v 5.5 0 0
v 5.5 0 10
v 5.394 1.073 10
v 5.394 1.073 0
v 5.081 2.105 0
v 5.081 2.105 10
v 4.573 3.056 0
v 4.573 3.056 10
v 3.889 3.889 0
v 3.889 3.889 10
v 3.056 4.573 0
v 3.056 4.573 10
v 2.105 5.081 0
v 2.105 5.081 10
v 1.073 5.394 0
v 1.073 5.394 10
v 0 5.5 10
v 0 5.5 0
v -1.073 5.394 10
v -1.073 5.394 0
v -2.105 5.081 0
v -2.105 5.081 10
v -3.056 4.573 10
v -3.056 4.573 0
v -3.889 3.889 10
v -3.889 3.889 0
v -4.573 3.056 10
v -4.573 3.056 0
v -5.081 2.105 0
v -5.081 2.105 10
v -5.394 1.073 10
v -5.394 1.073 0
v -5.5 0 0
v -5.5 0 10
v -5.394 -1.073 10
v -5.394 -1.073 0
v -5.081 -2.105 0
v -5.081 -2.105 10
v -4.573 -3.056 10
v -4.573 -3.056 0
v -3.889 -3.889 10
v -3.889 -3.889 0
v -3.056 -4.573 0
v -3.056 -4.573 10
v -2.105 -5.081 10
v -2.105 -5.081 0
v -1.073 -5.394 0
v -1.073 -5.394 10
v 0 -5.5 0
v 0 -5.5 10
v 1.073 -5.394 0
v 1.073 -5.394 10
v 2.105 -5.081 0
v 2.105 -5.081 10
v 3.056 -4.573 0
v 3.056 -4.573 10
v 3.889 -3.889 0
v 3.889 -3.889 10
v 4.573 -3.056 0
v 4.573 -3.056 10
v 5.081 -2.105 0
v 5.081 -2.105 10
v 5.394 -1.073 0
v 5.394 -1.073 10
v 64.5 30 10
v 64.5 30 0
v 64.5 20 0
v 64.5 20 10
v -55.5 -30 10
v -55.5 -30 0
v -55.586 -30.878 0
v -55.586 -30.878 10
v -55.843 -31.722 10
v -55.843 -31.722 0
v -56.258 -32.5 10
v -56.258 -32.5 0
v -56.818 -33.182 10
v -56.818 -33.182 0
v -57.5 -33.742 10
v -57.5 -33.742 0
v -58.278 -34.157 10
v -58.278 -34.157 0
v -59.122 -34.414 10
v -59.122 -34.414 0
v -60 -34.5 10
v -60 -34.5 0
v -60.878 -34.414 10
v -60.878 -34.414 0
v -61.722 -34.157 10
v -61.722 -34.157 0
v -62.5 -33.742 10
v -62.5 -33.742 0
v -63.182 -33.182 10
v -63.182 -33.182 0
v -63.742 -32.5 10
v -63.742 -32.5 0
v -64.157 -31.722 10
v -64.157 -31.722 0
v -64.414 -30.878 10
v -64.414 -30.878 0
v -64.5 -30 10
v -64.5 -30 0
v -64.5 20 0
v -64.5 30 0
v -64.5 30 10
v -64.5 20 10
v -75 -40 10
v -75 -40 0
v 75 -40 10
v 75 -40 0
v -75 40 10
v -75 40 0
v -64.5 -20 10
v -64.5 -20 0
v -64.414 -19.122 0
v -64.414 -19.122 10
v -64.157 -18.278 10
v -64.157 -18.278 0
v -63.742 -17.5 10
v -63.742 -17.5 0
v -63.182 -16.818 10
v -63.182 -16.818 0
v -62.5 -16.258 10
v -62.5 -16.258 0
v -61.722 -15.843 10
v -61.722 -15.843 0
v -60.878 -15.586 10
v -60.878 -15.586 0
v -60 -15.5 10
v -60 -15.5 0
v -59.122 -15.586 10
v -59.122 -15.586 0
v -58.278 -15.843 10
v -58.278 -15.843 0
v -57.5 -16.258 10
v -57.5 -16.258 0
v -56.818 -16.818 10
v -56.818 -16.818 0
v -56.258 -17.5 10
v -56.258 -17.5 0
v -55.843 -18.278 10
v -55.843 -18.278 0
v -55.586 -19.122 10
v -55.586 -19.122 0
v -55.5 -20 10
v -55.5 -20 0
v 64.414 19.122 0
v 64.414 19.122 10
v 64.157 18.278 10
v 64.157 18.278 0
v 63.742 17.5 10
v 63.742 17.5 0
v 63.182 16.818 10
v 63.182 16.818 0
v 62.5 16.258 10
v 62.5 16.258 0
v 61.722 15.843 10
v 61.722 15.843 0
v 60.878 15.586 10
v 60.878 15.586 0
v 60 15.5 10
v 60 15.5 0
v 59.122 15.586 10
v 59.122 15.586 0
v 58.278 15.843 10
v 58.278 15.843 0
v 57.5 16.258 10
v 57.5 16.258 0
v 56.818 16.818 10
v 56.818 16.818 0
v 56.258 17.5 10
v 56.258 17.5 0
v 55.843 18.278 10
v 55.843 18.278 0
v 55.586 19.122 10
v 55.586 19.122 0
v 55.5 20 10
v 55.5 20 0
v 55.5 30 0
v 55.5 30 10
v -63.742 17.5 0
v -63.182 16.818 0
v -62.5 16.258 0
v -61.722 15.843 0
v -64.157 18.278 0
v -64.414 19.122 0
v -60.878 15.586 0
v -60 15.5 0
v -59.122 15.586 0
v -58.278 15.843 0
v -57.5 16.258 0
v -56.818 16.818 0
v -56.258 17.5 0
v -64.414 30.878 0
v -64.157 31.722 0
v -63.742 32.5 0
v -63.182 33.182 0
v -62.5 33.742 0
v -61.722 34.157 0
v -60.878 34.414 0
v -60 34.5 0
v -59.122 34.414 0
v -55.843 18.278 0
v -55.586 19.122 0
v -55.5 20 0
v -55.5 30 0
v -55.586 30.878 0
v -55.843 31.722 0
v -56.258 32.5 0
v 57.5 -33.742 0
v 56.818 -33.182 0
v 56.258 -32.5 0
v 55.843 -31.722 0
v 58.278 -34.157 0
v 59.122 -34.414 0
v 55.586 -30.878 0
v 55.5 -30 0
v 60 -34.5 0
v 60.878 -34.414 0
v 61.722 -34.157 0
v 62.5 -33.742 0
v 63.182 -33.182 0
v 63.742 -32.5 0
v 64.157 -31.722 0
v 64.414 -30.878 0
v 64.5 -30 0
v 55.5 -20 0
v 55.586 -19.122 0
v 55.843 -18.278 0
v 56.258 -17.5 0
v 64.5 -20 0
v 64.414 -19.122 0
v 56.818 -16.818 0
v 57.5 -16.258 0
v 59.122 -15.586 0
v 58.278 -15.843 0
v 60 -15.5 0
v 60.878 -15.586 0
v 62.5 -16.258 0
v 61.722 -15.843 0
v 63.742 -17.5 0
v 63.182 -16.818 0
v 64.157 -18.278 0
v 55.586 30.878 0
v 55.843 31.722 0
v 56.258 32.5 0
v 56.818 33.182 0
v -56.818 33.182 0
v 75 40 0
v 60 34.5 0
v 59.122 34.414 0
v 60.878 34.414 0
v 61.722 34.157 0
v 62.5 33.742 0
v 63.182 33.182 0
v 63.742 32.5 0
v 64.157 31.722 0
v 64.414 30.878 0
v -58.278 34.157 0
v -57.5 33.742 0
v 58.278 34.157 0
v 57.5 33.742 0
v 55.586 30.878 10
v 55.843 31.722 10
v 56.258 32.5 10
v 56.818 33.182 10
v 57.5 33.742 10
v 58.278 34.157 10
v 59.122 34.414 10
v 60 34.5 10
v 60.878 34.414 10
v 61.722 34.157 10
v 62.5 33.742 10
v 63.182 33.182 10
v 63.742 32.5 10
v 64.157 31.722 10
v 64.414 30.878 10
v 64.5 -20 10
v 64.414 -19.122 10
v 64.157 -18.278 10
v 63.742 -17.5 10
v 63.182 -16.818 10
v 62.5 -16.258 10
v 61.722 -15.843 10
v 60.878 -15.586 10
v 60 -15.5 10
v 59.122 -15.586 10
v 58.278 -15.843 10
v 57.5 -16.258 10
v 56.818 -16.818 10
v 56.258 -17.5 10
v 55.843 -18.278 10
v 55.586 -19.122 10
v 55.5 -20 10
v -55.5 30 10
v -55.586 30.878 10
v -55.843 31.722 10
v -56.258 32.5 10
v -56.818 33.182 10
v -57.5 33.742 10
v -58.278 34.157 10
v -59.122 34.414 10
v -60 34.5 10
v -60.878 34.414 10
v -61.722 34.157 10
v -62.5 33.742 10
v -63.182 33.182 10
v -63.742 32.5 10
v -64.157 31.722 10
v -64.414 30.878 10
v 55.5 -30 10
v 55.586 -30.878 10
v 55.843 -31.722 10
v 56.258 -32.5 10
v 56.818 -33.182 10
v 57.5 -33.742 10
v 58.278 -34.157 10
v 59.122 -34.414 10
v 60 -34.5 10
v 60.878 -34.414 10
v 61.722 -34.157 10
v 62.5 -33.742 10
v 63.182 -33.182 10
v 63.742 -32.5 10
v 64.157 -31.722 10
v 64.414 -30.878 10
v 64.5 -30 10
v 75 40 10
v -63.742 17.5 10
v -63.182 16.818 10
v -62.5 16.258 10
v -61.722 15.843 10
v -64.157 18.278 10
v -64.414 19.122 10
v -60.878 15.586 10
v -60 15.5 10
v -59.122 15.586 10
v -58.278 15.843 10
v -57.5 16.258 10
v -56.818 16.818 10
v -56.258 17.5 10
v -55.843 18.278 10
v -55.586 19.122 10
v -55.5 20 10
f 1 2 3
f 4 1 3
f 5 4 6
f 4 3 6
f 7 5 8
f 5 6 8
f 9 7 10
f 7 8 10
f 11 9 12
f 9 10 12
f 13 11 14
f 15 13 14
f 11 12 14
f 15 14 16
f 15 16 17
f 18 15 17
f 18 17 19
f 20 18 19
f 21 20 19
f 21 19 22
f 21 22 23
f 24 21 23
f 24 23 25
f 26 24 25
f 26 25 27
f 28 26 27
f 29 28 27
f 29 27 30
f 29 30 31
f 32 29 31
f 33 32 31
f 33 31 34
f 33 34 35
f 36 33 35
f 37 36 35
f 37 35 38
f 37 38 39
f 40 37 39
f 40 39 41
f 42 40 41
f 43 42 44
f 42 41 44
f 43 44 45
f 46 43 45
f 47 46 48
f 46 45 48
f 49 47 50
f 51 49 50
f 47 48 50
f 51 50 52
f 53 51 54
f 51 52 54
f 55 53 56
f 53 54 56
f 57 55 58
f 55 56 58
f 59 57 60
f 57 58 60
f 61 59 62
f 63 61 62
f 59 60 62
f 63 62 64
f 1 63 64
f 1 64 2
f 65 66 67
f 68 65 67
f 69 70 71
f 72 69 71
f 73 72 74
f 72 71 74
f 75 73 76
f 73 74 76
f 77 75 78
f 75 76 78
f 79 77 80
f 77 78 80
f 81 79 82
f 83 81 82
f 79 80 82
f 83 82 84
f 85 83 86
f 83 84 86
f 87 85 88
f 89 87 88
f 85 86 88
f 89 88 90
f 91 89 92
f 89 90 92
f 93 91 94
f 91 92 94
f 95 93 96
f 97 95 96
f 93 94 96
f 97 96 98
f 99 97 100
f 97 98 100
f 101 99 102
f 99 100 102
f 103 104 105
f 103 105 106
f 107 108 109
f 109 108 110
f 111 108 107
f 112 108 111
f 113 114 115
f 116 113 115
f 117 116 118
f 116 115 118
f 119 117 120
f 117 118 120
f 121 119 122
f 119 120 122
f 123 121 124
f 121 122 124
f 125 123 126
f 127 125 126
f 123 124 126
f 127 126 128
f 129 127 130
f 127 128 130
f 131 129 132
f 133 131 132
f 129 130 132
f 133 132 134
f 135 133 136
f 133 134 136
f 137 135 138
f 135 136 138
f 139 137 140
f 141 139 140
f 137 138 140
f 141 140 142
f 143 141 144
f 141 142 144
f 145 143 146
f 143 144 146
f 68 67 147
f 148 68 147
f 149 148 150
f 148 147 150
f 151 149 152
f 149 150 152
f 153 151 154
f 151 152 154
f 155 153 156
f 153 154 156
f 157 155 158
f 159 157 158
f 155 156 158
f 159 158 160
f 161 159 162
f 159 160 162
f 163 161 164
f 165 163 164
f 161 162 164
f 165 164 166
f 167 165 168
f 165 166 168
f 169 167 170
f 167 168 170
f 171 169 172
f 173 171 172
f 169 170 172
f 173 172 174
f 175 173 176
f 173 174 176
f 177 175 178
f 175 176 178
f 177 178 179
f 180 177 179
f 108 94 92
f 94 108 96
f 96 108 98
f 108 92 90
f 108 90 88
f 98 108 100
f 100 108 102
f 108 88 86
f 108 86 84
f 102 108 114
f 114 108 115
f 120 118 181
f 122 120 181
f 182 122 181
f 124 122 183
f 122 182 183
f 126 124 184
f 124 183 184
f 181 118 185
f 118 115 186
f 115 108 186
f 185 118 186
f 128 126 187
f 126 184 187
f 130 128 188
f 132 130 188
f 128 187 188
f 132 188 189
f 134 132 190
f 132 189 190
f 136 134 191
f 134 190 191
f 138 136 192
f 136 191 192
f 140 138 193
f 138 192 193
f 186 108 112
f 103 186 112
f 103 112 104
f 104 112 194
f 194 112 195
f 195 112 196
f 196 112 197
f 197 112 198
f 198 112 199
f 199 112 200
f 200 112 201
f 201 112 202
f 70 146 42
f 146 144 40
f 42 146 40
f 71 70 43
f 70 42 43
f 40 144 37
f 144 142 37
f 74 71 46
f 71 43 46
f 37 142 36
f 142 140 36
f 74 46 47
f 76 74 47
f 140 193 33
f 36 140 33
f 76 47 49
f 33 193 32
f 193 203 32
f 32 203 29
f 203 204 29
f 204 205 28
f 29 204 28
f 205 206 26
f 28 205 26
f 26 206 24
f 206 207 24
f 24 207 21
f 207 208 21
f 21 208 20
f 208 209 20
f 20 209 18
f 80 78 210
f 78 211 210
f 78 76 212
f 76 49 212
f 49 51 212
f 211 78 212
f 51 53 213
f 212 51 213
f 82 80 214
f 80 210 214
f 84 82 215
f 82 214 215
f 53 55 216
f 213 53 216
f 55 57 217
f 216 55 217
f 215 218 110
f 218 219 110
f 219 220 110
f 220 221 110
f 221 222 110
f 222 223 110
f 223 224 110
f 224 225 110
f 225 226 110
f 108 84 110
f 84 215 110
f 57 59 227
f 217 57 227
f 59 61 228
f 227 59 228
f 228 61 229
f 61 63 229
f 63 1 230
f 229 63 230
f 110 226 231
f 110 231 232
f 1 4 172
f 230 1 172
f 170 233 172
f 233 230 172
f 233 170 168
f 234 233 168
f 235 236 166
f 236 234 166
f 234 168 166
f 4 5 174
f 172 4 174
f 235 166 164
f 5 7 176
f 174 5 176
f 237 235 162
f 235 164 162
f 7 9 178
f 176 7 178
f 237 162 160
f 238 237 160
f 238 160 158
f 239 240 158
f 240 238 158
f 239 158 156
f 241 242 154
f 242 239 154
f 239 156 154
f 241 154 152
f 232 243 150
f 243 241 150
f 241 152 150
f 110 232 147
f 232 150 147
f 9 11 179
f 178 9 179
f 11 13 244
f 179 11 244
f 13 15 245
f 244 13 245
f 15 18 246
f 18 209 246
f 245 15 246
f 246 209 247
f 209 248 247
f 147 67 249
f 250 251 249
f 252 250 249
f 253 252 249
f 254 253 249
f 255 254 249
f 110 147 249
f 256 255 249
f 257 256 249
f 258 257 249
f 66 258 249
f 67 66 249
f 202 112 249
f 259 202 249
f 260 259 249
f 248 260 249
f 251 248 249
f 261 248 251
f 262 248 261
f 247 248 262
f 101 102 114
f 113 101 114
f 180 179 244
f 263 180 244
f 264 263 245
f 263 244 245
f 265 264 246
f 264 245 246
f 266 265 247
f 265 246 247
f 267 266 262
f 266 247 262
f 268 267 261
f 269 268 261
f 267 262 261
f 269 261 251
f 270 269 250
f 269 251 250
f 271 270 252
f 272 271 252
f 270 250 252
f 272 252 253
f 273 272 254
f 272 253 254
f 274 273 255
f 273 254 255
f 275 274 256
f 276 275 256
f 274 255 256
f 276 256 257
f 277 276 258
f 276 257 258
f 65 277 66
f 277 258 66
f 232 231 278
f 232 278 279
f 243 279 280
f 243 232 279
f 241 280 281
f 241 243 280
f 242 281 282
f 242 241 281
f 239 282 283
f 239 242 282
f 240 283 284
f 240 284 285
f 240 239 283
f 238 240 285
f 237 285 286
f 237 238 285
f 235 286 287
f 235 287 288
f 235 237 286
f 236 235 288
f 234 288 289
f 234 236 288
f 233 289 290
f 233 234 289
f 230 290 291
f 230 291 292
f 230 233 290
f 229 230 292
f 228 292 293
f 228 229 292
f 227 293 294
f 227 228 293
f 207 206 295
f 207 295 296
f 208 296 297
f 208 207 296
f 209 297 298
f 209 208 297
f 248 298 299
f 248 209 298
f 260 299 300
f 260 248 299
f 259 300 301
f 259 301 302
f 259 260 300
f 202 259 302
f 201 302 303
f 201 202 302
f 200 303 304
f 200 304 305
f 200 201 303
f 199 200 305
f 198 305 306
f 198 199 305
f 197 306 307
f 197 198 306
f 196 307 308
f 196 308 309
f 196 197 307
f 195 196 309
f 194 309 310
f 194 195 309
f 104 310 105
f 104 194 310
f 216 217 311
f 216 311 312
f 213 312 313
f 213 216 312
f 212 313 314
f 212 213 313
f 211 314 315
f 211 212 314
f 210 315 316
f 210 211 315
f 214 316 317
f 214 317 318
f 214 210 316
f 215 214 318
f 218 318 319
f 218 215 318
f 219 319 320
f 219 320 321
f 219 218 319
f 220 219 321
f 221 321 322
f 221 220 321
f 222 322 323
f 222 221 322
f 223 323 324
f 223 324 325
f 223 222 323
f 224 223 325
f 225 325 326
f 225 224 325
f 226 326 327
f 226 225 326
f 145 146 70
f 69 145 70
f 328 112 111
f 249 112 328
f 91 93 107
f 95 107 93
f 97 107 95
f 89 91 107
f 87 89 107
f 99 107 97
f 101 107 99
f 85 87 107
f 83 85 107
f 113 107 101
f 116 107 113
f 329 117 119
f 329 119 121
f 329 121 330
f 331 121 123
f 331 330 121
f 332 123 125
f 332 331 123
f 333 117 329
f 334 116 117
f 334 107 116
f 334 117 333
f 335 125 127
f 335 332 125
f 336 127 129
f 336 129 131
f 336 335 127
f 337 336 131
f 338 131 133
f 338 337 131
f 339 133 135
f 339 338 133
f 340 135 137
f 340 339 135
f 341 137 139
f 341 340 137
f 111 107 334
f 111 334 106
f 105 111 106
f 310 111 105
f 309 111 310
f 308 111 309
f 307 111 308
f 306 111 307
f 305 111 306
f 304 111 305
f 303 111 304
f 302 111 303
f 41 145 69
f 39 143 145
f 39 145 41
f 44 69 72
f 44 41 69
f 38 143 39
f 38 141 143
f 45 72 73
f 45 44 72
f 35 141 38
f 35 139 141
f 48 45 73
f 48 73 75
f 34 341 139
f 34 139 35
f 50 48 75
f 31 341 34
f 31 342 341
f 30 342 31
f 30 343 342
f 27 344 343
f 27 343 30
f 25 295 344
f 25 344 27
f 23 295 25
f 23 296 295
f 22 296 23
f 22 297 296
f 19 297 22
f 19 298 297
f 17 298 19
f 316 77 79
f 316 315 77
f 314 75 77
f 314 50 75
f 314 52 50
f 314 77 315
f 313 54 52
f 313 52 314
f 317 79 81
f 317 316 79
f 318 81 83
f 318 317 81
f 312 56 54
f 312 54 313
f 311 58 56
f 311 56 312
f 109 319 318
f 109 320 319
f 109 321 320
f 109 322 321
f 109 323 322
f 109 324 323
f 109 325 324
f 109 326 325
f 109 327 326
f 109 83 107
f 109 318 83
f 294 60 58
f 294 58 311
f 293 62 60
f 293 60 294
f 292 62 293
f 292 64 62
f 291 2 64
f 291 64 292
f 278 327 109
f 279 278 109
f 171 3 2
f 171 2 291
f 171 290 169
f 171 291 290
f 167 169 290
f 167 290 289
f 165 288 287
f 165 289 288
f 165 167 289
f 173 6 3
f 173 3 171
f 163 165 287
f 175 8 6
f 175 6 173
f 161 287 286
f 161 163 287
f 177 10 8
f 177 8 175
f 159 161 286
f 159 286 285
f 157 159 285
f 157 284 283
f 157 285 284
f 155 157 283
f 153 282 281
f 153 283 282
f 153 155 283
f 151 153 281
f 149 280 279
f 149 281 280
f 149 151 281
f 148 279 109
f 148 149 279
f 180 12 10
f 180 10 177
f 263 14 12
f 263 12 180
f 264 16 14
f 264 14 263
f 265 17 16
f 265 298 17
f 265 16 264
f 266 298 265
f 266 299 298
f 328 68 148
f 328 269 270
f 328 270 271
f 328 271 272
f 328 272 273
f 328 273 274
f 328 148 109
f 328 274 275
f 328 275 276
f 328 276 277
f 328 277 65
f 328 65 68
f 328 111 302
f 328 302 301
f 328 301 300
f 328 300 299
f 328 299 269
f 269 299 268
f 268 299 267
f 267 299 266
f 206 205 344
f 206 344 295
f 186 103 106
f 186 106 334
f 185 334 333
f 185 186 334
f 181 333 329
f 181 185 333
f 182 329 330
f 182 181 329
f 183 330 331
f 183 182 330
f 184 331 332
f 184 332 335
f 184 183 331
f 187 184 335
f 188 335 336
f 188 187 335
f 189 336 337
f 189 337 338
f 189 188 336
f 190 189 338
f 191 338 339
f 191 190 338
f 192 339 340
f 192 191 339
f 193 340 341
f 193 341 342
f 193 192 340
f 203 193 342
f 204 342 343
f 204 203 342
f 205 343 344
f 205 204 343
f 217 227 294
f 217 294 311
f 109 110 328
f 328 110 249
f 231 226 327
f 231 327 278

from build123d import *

# Parameters (mm, degrees)
SKETCH_1_W      = 150
SKETCH_1_H      = 80
EXTRUDE_1_DEPTH = 10
MM_1_D          = 11
MM_1_DEPTH      = 24.5
MM_1_TIP        = 3.304733405


with BuildPart() as part:
    # 草图1 → 凸台-拉伸1 (new body)
    with BuildSketch(Plane.XY):
        Rectangle(SKETCH_1_W, SKETCH_1_H)
        with BuildLine():
            Line((-55.5, -20), (-55.5, -30))
            ThreePointArc((-55.5, -30), (-60, -34.5), (-64.5, -30))
            Line((-64.5, -30), (-64.5, -20))
            ThreePointArc((-64.5, -20), (-60, -15.5), (-55.5, -20))
        make_face(mode=Mode.SUBTRACT)
        with BuildLine():
            Line((-55.5, 20), (-55.5, 30))
            ThreePointArc((-55.5, 30), (-60, 34.5), (-64.5, 30))
            Line((-64.5, 30), (-64.5, 20))
            ThreePointArc((-64.5, 20), (-60, 15.5), (-55.5, 20))
        make_face(mode=Mode.SUBTRACT)
        with BuildLine():
            Line((55.5, -20), (55.5, -30))
            ThreePointArc((55.5, -30), (60, -34.5), (64.5, -30))
            Line((64.5, -30), (64.5, -20))
            ThreePointArc((64.5, -20), (60, -15.5), (55.5, -20))
        make_face(mode=Mode.SUBTRACT)
        with BuildLine():
            Line((55.5, 20), (55.5, 30))
            ThreePointArc((55.5, 30), (60, 34.5), (64.5, 30))
            Line((64.5, 30), (64.5, 20))
            ThreePointArc((64.5, 20), (60, 15.5), (55.5, 20))
        make_face(mode=Mode.SUBTRACT)
    extrude(amount=EXTRUDE_1_DEPTH)

    # 大小mm 暗销孔1
    with Locations(Plane(origin=(0, 0, 0), x_dir=(-1, 0, 0), z_dir=(0, 0, -1))):
        with Locations((0, 0)):
            Hole(MM_1_D / 2, depth=MM_1_DEPTH)
            with Locations((0, 0, -(MM_1_DEPTH + MM_1_TIP / 2))):  # 118° drill point
                Cone(0, MM_1_D / 2, MM_1_TIP, mode=Mode.SUBTRACT)


solid = part.part
